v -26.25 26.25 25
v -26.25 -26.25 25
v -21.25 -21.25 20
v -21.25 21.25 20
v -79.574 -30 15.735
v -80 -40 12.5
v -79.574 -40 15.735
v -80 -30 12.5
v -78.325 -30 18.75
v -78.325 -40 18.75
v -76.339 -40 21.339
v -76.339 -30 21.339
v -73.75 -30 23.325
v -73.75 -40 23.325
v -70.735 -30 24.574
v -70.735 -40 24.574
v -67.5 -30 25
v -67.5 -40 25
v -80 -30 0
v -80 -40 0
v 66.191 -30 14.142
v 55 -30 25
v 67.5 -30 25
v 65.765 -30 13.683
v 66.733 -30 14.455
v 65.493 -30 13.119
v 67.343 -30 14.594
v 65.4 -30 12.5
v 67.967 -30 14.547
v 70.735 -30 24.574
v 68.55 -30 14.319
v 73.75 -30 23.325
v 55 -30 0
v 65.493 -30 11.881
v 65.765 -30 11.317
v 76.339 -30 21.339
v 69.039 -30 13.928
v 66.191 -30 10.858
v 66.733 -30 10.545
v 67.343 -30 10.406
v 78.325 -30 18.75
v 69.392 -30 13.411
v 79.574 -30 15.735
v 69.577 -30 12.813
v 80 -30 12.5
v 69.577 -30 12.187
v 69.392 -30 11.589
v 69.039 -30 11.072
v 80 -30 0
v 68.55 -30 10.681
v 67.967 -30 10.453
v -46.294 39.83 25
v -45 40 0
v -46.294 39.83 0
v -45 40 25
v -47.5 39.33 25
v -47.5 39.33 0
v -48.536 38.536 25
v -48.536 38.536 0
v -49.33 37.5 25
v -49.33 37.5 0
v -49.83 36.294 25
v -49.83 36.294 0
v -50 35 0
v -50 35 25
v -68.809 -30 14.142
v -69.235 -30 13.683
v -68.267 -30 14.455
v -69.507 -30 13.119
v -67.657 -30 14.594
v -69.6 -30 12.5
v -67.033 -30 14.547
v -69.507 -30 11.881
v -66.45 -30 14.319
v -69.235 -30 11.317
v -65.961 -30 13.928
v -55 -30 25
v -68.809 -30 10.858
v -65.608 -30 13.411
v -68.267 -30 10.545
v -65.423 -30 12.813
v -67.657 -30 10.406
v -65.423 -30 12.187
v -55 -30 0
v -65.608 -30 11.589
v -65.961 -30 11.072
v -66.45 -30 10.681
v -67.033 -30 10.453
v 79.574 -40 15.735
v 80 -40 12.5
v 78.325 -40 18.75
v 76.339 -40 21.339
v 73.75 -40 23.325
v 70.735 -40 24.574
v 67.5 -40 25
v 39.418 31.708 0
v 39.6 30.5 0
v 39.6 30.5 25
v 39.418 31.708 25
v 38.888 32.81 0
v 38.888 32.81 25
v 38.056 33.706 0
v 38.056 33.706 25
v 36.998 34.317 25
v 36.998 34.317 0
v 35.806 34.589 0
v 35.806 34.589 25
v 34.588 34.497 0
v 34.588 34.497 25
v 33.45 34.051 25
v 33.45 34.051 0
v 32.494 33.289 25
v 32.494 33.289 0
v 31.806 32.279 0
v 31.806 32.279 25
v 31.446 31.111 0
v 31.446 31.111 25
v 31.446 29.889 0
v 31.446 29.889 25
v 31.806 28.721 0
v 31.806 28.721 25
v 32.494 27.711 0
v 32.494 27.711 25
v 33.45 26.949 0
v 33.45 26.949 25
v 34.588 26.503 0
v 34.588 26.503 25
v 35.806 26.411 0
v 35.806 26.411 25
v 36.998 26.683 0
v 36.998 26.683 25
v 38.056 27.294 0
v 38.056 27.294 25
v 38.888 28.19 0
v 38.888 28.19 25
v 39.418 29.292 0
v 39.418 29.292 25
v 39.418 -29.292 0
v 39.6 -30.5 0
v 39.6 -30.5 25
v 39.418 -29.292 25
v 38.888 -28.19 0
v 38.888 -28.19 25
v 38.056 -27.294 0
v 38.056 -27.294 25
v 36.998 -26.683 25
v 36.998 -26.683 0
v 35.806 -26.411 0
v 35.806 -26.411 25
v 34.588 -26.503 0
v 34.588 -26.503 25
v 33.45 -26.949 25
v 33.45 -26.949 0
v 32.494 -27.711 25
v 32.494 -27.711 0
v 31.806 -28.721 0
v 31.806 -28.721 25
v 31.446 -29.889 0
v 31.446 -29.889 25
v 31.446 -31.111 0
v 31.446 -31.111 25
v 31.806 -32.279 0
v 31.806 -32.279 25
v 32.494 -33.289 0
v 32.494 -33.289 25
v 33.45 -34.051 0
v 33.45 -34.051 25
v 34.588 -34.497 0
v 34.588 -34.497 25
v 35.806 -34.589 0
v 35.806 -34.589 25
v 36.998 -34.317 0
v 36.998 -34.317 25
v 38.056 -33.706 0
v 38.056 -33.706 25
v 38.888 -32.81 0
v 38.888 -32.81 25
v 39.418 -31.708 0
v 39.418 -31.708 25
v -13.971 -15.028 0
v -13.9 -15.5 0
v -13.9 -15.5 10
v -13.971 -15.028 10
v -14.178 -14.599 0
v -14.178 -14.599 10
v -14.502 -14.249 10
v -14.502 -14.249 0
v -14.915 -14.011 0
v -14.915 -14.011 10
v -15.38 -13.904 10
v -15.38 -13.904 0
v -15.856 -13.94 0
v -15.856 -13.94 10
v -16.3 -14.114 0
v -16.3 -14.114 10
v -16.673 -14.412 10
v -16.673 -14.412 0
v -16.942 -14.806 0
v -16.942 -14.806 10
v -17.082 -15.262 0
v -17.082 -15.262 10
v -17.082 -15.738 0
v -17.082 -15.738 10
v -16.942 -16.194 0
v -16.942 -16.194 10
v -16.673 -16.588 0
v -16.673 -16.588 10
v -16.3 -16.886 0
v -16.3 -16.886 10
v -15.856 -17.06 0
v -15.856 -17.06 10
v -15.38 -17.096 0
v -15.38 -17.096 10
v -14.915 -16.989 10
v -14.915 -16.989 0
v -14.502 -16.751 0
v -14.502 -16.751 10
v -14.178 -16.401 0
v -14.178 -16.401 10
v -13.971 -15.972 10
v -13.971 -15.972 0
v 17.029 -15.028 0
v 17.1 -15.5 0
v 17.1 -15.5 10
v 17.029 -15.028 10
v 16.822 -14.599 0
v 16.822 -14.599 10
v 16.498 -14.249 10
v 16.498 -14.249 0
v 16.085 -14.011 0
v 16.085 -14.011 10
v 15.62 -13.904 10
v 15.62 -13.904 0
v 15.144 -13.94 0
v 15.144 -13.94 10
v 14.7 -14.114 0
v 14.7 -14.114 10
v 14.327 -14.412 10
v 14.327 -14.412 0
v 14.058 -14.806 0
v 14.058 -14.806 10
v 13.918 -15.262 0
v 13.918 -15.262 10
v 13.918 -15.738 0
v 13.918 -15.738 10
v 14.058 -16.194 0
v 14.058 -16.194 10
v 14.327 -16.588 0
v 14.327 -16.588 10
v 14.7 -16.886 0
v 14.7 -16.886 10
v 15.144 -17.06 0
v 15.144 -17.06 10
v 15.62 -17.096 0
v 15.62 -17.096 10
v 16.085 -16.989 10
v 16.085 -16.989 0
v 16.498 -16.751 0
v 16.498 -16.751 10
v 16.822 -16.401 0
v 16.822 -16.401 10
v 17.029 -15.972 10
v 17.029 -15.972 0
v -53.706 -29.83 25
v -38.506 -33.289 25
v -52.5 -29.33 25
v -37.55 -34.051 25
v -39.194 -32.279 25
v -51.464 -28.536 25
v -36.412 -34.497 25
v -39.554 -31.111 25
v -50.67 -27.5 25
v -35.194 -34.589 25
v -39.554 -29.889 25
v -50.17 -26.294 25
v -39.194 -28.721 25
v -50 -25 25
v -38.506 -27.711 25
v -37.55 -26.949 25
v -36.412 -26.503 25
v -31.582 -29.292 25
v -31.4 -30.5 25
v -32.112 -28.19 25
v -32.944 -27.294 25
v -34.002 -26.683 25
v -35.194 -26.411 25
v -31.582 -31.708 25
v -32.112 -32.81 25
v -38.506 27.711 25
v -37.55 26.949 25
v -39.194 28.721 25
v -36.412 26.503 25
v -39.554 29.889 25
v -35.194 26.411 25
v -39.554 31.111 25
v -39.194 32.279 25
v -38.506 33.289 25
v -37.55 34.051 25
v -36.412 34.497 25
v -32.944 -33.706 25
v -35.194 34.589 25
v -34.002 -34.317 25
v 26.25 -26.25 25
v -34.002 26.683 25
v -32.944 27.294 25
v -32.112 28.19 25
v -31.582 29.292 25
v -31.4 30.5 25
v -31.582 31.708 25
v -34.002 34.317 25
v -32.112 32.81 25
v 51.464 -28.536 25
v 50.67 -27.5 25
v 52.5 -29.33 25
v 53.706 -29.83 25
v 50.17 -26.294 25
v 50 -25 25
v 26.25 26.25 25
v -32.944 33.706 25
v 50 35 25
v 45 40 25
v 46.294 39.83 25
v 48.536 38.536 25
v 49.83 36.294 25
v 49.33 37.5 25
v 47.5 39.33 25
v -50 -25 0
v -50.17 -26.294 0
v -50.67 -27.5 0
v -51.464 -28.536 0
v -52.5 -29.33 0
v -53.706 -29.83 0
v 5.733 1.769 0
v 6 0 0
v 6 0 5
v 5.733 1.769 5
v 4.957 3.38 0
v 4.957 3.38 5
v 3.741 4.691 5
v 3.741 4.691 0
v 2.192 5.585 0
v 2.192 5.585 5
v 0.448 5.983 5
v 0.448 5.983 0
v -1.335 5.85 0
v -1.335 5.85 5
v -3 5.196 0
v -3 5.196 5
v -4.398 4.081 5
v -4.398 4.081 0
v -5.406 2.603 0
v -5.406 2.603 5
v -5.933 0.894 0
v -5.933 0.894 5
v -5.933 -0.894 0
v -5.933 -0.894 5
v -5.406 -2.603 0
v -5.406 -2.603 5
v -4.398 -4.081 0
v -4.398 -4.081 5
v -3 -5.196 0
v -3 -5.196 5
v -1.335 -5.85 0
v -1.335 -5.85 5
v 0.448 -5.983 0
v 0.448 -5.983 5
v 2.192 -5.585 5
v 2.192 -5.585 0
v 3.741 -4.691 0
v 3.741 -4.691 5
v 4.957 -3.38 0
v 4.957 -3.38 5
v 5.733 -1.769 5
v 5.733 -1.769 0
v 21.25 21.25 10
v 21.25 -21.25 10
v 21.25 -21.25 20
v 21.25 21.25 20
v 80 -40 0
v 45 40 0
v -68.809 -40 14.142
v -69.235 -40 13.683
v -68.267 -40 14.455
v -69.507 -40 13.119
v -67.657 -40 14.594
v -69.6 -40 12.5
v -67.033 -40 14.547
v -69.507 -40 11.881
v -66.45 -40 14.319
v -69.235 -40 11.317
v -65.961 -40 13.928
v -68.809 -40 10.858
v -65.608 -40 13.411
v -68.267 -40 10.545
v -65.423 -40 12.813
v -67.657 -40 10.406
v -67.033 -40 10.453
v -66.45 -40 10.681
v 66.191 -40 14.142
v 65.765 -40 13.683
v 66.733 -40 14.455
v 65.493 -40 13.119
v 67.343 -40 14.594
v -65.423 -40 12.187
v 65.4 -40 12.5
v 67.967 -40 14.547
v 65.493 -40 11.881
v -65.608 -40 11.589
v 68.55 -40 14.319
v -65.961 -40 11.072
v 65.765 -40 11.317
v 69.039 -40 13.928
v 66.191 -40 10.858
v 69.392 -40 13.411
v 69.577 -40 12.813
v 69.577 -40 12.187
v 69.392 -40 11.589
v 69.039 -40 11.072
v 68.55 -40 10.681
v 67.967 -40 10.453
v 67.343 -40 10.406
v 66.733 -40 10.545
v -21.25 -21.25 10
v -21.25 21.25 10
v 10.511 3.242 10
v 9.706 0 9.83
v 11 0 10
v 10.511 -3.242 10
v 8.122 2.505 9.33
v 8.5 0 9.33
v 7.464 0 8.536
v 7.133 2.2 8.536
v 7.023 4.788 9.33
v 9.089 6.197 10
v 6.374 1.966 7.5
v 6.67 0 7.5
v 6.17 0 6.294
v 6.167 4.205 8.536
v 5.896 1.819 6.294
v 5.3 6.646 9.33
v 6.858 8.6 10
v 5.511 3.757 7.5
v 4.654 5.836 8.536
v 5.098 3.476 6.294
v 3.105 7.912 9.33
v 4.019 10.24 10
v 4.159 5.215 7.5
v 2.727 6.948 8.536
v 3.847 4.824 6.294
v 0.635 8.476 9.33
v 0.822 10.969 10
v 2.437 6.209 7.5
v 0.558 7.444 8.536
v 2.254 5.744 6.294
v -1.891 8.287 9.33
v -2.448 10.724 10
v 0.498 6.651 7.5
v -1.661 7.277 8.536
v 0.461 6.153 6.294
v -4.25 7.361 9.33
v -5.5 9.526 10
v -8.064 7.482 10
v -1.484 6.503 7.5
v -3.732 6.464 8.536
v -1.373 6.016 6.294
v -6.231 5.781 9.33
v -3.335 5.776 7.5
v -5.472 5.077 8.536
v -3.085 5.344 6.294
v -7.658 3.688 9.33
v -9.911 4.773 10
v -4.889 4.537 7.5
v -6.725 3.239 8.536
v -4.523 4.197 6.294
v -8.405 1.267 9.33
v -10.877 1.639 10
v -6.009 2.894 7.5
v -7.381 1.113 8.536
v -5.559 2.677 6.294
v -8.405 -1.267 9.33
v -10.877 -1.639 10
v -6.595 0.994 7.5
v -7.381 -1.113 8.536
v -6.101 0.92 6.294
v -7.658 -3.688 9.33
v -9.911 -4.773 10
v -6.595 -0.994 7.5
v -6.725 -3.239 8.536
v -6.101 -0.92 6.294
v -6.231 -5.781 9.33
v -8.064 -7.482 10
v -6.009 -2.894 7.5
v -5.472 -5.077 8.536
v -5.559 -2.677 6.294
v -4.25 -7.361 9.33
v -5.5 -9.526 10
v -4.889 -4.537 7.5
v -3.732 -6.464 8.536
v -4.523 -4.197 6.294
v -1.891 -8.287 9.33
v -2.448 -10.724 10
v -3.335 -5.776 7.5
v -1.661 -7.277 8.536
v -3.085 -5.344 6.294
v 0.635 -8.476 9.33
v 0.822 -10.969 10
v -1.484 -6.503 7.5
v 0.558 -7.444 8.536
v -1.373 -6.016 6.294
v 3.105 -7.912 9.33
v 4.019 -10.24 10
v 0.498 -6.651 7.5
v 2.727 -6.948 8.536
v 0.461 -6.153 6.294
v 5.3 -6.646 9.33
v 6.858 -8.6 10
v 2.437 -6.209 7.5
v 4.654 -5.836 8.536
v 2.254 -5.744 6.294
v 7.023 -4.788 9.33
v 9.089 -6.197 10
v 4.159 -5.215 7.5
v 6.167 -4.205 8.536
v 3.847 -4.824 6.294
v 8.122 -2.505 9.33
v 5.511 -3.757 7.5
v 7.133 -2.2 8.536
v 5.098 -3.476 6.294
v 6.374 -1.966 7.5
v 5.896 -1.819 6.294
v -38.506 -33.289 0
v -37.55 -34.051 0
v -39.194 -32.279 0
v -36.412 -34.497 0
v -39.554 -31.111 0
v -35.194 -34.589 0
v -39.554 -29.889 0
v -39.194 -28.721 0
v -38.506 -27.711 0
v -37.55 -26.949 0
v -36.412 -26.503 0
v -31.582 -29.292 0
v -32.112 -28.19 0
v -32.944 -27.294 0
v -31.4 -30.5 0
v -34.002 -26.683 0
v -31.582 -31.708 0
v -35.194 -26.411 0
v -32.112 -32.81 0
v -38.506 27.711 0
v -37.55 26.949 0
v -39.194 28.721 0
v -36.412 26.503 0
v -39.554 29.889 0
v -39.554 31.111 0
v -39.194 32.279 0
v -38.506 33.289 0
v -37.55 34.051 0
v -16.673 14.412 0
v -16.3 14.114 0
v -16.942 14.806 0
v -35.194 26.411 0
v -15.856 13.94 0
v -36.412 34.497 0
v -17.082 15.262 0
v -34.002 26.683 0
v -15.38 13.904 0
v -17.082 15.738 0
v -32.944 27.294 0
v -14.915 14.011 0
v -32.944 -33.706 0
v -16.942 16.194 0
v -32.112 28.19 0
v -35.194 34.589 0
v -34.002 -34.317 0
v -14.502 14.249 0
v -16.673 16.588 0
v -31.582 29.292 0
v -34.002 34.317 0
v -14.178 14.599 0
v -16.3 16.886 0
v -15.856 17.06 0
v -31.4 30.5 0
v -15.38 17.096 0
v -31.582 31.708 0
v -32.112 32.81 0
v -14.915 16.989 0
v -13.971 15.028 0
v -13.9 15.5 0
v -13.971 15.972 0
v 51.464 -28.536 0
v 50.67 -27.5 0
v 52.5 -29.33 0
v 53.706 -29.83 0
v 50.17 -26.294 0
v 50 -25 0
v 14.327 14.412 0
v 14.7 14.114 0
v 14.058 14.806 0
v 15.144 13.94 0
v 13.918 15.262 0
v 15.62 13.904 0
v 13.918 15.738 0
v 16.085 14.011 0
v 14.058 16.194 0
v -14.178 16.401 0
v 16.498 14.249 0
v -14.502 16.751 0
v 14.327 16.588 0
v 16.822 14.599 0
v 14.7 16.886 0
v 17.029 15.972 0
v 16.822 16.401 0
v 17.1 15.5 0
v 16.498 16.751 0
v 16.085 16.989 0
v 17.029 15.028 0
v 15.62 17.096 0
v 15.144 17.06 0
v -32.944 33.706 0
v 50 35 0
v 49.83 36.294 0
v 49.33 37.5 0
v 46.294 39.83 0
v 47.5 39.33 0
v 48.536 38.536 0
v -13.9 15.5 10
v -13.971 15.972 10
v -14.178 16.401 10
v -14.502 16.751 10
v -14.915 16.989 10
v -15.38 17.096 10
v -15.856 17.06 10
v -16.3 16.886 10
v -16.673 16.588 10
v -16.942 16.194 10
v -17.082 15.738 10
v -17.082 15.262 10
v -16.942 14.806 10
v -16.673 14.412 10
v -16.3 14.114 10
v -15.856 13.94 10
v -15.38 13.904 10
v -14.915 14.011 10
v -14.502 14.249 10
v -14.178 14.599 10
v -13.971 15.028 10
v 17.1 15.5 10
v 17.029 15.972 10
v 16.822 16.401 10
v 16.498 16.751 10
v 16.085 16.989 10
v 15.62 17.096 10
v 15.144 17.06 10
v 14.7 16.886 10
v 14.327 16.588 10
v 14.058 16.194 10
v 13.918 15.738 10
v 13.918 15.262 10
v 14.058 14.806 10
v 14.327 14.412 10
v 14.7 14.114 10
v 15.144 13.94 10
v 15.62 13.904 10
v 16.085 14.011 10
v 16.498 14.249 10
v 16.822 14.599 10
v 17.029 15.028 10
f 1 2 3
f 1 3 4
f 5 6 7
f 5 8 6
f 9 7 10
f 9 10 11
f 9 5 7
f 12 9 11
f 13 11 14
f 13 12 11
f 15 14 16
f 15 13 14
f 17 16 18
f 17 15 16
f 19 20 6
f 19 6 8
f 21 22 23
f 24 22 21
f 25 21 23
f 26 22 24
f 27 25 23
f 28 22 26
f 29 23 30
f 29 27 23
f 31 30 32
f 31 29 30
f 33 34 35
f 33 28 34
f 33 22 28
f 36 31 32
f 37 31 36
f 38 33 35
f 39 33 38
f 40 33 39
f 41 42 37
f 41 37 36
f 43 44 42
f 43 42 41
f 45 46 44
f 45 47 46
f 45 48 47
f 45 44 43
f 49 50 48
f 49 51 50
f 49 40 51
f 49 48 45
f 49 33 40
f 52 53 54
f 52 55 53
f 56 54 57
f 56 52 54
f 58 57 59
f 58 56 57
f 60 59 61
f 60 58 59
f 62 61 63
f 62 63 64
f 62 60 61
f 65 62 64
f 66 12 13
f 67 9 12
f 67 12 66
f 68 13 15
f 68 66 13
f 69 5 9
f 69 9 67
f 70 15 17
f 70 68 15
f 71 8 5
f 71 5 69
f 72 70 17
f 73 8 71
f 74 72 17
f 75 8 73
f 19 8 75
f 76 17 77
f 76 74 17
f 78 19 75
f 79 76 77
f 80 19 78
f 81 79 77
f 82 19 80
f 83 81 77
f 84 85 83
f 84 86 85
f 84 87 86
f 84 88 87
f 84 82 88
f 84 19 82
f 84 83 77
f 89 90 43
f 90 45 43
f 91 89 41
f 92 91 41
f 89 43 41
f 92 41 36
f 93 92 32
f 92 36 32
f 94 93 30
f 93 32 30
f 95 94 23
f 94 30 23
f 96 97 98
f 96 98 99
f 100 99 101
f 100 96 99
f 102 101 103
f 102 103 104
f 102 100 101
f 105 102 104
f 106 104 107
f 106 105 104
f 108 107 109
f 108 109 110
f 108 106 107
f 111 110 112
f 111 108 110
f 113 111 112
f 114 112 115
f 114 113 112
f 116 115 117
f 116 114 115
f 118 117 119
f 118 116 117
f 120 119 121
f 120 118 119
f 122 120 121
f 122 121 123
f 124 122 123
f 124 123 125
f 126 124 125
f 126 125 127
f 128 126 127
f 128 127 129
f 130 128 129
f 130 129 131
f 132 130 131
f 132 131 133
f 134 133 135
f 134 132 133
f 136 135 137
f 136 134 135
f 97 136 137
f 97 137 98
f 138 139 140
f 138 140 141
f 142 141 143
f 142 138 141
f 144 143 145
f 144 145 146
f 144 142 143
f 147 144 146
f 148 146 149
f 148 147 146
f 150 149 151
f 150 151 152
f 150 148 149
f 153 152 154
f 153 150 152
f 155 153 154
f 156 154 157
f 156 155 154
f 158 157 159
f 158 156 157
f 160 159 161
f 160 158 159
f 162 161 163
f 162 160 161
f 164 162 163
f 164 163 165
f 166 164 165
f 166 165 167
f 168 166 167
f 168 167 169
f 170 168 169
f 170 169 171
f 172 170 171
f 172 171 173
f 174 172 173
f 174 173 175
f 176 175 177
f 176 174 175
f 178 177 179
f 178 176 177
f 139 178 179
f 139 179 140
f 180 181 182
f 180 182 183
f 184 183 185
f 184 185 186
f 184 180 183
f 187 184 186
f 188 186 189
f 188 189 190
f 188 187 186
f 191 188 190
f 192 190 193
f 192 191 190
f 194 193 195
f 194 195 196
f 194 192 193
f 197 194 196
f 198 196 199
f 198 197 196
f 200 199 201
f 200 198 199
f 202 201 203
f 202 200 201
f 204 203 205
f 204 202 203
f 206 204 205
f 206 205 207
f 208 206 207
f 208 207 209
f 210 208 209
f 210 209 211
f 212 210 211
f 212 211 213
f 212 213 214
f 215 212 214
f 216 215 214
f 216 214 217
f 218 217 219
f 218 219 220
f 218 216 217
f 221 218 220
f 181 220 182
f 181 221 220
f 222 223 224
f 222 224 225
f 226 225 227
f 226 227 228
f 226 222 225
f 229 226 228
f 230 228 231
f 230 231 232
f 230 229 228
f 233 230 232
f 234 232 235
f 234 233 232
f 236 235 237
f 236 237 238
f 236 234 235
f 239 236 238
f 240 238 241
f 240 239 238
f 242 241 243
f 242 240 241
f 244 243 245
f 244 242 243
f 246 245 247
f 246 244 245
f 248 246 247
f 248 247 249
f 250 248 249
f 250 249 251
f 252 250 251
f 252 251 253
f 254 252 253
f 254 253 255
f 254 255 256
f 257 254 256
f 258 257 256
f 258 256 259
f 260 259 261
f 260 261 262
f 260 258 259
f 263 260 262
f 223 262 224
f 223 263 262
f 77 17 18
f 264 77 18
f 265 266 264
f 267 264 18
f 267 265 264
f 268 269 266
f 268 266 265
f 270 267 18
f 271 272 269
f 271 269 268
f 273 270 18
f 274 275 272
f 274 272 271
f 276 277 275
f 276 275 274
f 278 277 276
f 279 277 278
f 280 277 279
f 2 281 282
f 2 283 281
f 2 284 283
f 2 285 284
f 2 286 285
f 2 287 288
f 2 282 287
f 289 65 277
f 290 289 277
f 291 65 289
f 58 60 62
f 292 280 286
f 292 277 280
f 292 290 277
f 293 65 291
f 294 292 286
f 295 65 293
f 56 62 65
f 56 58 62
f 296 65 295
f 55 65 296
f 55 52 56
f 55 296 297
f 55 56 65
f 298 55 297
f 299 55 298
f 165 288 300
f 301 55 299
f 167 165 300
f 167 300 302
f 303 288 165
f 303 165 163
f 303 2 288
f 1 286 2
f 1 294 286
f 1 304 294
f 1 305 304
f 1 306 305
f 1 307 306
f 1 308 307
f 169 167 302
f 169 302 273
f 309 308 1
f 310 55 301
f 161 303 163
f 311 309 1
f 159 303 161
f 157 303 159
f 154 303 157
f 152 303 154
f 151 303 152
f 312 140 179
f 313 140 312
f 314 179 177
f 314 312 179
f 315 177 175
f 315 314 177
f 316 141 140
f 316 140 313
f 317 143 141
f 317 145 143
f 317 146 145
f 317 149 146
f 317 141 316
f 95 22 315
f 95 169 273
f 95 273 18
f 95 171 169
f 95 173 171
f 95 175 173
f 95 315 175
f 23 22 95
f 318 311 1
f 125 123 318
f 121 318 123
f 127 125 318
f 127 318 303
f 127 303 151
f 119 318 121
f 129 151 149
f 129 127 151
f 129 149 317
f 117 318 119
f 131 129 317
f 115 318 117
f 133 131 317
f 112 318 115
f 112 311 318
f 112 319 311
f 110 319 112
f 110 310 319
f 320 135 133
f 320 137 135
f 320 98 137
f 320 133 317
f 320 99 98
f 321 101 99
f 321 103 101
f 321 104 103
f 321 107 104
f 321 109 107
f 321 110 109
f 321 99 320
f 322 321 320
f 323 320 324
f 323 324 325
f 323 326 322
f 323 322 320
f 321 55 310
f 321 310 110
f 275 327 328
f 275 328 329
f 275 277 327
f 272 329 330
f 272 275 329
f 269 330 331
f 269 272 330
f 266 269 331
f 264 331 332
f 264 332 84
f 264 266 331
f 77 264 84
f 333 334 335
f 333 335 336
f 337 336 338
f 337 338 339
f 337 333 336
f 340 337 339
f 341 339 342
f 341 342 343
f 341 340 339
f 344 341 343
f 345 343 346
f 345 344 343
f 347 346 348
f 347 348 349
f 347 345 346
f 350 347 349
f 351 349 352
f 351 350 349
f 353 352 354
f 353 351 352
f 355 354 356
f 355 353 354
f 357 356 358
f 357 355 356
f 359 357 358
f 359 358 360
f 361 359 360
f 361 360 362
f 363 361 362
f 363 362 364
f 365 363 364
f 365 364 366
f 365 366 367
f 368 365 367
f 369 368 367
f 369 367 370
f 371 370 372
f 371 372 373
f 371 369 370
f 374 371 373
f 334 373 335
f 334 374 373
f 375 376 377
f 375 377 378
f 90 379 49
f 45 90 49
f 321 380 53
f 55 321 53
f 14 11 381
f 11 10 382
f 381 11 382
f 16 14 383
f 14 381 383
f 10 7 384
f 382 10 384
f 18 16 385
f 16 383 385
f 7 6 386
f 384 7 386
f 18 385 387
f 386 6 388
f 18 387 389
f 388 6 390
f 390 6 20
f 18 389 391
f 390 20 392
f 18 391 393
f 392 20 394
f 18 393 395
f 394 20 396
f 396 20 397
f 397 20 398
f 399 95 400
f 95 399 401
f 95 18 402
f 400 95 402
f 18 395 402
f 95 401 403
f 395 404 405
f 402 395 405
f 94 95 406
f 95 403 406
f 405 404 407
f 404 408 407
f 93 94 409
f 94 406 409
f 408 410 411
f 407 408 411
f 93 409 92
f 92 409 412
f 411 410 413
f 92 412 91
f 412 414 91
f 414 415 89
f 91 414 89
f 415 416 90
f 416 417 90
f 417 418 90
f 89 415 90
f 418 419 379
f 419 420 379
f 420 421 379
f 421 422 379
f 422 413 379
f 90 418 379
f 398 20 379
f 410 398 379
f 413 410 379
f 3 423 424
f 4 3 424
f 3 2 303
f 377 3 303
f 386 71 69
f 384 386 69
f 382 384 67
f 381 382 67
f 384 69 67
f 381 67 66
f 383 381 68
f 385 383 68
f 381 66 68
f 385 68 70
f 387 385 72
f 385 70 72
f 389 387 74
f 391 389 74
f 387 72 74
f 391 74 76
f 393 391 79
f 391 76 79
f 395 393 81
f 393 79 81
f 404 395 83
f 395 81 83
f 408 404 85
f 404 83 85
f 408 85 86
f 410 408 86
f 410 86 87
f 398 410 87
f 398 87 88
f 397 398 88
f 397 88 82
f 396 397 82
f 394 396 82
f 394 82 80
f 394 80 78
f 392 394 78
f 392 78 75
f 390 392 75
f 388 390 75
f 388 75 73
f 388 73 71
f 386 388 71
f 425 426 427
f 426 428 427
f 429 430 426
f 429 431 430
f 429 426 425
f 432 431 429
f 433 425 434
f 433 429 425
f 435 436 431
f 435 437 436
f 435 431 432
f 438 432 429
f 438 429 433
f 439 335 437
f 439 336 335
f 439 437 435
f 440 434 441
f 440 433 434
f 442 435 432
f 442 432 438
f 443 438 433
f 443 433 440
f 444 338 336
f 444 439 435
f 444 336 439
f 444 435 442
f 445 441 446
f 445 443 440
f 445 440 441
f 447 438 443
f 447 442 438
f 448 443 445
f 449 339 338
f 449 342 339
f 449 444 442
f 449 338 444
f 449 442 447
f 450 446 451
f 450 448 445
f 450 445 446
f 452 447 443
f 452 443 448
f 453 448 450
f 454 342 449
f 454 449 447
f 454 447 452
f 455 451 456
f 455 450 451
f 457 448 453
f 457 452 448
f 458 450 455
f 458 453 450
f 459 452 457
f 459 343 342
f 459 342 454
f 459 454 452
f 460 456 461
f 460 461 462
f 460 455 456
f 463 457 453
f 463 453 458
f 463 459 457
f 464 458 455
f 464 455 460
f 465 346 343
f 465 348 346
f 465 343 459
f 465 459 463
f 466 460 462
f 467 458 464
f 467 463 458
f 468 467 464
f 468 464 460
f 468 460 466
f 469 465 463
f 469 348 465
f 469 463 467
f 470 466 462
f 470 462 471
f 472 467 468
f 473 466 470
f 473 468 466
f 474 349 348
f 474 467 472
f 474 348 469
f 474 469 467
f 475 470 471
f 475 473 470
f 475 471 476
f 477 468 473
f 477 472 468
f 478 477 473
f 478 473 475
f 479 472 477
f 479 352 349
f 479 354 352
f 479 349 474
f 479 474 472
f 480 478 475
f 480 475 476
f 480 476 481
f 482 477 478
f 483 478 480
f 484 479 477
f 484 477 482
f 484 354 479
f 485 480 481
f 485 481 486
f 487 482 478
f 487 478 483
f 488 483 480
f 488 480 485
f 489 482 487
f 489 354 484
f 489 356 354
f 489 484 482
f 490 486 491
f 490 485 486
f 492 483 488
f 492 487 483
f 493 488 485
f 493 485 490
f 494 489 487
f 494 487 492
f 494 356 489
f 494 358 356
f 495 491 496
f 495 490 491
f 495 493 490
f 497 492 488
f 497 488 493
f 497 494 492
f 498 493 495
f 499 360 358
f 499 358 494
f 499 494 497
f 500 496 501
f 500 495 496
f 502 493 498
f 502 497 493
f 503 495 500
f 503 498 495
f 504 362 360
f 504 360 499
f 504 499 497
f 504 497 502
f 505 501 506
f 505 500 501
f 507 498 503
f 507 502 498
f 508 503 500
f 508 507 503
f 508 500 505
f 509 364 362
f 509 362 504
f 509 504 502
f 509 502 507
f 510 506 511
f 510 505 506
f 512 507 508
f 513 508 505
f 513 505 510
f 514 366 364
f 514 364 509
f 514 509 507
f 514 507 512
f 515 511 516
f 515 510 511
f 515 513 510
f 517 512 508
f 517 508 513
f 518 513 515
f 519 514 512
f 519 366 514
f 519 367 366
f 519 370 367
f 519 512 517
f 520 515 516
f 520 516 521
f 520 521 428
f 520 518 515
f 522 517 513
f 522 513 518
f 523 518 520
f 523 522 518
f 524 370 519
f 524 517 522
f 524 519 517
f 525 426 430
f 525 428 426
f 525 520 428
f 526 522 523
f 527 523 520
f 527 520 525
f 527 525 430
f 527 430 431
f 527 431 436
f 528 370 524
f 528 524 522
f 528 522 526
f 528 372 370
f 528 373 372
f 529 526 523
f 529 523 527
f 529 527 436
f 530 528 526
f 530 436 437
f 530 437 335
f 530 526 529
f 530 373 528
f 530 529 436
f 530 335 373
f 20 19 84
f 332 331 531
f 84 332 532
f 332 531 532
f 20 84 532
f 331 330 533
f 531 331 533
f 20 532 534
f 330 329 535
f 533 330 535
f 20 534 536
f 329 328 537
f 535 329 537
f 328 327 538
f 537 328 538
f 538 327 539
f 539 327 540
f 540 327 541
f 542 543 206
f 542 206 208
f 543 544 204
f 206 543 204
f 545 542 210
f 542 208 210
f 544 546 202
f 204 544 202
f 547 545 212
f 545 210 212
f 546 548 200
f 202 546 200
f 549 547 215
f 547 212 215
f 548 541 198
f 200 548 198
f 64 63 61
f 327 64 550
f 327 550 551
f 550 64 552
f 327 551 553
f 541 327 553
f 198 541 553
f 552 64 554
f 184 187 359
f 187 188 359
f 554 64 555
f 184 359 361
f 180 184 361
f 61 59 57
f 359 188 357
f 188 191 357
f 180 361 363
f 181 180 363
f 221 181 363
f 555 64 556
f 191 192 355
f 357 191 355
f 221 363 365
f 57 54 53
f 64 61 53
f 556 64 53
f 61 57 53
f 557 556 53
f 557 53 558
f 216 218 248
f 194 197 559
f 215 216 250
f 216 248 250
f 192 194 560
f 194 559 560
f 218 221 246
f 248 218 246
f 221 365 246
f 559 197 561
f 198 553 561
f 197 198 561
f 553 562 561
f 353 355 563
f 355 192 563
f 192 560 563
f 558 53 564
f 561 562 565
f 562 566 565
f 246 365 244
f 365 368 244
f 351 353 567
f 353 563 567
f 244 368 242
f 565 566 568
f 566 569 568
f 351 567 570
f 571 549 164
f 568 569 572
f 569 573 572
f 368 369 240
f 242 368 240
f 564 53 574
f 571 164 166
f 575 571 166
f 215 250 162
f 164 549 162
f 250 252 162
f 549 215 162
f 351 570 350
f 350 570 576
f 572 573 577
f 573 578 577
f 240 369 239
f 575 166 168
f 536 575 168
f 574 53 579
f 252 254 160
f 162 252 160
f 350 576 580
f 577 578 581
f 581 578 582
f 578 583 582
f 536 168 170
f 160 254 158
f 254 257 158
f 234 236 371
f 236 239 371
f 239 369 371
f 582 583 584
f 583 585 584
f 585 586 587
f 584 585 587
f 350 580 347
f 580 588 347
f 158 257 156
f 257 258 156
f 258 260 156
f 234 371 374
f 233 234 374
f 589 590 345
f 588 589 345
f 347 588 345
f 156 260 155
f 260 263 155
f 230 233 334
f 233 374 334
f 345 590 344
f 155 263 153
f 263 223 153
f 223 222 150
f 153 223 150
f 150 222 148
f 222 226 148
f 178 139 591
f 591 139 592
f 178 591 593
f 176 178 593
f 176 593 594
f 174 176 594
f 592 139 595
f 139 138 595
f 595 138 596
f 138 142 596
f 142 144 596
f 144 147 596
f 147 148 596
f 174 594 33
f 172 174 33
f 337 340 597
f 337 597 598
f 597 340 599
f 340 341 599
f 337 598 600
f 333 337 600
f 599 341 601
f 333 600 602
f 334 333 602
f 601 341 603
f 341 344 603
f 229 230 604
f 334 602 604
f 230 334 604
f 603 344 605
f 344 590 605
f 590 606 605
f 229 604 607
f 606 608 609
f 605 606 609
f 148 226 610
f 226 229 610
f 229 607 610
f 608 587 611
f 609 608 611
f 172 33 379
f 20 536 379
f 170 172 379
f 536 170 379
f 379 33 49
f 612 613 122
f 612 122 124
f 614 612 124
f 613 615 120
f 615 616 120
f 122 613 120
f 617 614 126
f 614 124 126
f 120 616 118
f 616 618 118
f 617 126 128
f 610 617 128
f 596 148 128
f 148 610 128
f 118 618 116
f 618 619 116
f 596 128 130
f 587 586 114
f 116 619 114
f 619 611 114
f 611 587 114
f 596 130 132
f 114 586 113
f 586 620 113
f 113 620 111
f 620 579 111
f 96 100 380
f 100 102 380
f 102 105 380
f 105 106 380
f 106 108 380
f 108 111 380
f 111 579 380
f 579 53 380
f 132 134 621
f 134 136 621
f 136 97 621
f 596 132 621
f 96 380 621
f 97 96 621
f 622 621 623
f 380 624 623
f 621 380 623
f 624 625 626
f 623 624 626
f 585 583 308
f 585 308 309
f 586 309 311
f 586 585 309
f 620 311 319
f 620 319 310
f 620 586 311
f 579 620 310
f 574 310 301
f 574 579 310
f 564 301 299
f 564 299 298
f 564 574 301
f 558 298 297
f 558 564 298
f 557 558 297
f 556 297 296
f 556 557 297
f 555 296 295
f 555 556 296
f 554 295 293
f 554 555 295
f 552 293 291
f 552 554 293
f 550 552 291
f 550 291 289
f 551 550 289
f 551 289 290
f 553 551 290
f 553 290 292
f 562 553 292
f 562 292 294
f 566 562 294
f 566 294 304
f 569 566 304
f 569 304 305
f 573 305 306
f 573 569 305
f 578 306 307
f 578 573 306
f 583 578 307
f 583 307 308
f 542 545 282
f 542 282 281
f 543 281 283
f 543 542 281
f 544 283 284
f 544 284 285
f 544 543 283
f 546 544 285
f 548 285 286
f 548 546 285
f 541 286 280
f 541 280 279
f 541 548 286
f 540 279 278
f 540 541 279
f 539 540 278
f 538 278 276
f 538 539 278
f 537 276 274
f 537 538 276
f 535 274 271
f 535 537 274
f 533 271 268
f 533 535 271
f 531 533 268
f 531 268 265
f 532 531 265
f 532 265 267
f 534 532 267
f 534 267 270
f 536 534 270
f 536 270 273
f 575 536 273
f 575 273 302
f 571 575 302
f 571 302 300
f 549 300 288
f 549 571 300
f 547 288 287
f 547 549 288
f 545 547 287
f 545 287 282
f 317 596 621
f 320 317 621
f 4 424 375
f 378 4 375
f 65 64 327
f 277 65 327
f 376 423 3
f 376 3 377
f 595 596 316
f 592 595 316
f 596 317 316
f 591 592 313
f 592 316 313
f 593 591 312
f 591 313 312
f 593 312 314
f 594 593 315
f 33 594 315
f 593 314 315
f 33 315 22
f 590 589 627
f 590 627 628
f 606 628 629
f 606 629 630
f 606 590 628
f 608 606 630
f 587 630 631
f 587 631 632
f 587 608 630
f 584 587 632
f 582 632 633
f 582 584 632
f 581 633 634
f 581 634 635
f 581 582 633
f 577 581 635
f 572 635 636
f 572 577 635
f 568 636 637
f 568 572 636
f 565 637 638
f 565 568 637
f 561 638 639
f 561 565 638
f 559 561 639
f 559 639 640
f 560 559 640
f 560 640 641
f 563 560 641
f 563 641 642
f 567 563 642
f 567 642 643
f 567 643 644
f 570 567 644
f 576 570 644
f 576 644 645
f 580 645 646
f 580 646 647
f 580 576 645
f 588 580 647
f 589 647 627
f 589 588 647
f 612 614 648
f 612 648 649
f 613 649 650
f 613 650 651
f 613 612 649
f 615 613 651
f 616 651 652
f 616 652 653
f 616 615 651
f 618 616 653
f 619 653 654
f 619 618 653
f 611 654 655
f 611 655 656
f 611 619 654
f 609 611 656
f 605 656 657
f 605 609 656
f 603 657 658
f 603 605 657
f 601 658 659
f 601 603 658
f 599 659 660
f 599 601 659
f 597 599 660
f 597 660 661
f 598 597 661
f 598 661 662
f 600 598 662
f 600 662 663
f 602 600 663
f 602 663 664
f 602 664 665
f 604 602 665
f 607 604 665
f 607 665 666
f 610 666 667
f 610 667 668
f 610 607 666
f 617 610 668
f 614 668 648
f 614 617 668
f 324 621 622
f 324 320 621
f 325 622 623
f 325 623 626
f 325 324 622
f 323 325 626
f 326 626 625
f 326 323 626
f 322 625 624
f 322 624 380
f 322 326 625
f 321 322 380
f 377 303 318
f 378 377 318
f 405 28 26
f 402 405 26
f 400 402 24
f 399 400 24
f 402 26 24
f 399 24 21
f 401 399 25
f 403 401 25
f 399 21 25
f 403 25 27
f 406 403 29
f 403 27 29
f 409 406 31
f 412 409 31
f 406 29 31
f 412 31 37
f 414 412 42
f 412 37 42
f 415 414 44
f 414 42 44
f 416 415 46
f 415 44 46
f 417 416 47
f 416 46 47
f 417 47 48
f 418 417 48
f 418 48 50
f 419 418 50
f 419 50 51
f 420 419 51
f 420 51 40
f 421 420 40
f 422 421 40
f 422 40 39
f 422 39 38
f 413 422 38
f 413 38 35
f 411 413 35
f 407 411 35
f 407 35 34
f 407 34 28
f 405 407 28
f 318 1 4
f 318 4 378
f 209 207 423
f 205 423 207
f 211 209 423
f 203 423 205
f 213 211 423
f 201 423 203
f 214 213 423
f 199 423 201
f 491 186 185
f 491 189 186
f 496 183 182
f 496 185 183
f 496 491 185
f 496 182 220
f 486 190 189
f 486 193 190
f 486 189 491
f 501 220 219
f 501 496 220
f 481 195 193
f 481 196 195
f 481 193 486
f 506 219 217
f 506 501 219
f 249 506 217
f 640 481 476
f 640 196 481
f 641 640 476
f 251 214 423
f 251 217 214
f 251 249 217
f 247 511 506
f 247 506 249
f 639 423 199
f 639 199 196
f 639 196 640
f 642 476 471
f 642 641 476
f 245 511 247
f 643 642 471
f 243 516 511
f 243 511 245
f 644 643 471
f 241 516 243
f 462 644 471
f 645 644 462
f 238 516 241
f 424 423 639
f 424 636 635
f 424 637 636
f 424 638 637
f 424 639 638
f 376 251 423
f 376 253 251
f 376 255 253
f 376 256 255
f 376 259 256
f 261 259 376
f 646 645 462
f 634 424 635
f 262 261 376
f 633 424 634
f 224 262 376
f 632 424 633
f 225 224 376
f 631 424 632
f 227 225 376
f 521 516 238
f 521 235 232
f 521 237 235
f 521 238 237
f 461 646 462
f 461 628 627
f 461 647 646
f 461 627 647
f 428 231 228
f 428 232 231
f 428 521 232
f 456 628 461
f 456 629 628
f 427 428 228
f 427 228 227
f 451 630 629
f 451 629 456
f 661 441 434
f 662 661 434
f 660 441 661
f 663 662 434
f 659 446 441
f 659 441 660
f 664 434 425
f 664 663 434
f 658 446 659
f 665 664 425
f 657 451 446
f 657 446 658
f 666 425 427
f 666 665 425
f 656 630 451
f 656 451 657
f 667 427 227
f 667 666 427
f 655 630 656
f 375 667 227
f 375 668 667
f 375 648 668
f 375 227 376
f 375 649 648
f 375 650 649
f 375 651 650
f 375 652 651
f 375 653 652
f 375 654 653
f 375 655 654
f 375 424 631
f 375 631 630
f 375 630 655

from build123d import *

# Parameters (mm, degrees)
F0_R      = 4.1
F0_W      = 42.5
F0_H      = 42.5
F0_W_2    = 30
F0_H_2    = 10
F1_DEPTH  = 25
F0_R_2    = 1.6
F0_R_3    = 6
F2_DEPTH  = 10
F3_SIZE   = 5
F4_R      = 5
F5_R      = 5
F6_R      = 2.1
F7_DEPTH  = 25
F8_R      = 12.5
F9_R      = 2.1
F10_DEPTH = 25


with BuildPart() as f1:
    # F0 (on Top) → F1 (new body)
    with BuildSketch(Plane.XY):
        Polygon((-50, -30), (-50, -40), (50, -40), (50, -30), (50, 40), (-50, 40), align=None)
        with Locations((-35.5, -30.5)):
            Circle(F0_R, mode=Mode.SUBTRACT)
        with Locations((35.5, -30.5)):
            Circle(F0_R, mode=Mode.SUBTRACT)
        with Locations((-35.5, 30.5)):
            Circle(F0_R, mode=Mode.SUBTRACT)
        Rectangle(F0_W, F0_H, mode=Mode.SUBTRACT)
        with Locations((35.5, 30.5)):
            Circle(F0_R, mode=Mode.SUBTRACT)
        with Locations((-65, -35)):
            Rectangle(F0_W_2, F0_H_2)
        with Locations((65, -35)):
            Rectangle(F0_W_2, F0_H_2)
    extrude(amount=F1_DEPTH)

    # F0 (on Top) → F2 (join)
    with BuildSketch(Plane.XY):
        Rectangle(F0_W, F0_H)
        with Locations((-15.5, -15.5)):
            Circle(F0_R_2, mode=Mode.SUBTRACT)
        with Locations((15.5, -15.5)):
            Circle(F0_R_2, mode=Mode.SUBTRACT)
        with Locations((-15.5, 15.5)):
            Circle(F0_R_2, mode=Mode.SUBTRACT)
        Circle(F0_R_3, mode=Mode.SUBTRACT)
        with Locations((15.5, 15.5)):
            Circle(F0_R_2, mode=Mode.SUBTRACT)
    extrude(amount=F2_DEPTH)

    # F3
    f3_edges = [f1.edges().sort_by_distance(p)[0] for p in [
        (-21.25, 0, 25),
        (0, 21.25, 25),
        (21.25, 0, 25),
        (0, -21.25, 25),
    ]]
    chamfer(f3_edges, length=F3_SIZE)

    # F4
    f4_edges = [f1.edges().sort_by_distance(p)[0] for p in [
        (-6, 0, 10),
    ]]
    fillet(f4_edges, radius=F4_R)

    # F5
    f5_edges = [f1.edges().sort_by_distance(p)[0] for p in [
        (50, -30, 12.5),
        (-50, -30, 12.5),
        (-50, 40, 12.5),
        (50, 40, 12.5),
    ]]
    fillet(f5_edges, radius=F5_R)

    # F6 (on face) → F7 (cut)
    with BuildSketch(Plane(origin=(0, -30, 0), x_dir=(-1, 0, 0), z_dir=(0, 1, 0))):
        with Locations((67.5, 12.5)):
            Circle(F6_R)
    extrude(amount=-F7_DEPTH, mode=Mode.SUBTRACT)

    # F8
    f8_edges = [f1.edges().sort_by_distance(p)[0] for p in [
        (-80, -35, 25),
        (80, -35, 25),
    ]]
    fillet(f8_edges, radius=F8_R)

    # F9 (on face) → F10 (cut)
    with BuildSketch(Plane(origin=(0, -30, 0), x_dir=(-1, 0, 0), z_dir=(0, 1, 0))):
        with Locations((-67.5, 12.5)):
            Circle(F9_R)
    extrude(amount=-F10_DEPTH, mode=Mode.SUBTRACT)


solid = f1.part
